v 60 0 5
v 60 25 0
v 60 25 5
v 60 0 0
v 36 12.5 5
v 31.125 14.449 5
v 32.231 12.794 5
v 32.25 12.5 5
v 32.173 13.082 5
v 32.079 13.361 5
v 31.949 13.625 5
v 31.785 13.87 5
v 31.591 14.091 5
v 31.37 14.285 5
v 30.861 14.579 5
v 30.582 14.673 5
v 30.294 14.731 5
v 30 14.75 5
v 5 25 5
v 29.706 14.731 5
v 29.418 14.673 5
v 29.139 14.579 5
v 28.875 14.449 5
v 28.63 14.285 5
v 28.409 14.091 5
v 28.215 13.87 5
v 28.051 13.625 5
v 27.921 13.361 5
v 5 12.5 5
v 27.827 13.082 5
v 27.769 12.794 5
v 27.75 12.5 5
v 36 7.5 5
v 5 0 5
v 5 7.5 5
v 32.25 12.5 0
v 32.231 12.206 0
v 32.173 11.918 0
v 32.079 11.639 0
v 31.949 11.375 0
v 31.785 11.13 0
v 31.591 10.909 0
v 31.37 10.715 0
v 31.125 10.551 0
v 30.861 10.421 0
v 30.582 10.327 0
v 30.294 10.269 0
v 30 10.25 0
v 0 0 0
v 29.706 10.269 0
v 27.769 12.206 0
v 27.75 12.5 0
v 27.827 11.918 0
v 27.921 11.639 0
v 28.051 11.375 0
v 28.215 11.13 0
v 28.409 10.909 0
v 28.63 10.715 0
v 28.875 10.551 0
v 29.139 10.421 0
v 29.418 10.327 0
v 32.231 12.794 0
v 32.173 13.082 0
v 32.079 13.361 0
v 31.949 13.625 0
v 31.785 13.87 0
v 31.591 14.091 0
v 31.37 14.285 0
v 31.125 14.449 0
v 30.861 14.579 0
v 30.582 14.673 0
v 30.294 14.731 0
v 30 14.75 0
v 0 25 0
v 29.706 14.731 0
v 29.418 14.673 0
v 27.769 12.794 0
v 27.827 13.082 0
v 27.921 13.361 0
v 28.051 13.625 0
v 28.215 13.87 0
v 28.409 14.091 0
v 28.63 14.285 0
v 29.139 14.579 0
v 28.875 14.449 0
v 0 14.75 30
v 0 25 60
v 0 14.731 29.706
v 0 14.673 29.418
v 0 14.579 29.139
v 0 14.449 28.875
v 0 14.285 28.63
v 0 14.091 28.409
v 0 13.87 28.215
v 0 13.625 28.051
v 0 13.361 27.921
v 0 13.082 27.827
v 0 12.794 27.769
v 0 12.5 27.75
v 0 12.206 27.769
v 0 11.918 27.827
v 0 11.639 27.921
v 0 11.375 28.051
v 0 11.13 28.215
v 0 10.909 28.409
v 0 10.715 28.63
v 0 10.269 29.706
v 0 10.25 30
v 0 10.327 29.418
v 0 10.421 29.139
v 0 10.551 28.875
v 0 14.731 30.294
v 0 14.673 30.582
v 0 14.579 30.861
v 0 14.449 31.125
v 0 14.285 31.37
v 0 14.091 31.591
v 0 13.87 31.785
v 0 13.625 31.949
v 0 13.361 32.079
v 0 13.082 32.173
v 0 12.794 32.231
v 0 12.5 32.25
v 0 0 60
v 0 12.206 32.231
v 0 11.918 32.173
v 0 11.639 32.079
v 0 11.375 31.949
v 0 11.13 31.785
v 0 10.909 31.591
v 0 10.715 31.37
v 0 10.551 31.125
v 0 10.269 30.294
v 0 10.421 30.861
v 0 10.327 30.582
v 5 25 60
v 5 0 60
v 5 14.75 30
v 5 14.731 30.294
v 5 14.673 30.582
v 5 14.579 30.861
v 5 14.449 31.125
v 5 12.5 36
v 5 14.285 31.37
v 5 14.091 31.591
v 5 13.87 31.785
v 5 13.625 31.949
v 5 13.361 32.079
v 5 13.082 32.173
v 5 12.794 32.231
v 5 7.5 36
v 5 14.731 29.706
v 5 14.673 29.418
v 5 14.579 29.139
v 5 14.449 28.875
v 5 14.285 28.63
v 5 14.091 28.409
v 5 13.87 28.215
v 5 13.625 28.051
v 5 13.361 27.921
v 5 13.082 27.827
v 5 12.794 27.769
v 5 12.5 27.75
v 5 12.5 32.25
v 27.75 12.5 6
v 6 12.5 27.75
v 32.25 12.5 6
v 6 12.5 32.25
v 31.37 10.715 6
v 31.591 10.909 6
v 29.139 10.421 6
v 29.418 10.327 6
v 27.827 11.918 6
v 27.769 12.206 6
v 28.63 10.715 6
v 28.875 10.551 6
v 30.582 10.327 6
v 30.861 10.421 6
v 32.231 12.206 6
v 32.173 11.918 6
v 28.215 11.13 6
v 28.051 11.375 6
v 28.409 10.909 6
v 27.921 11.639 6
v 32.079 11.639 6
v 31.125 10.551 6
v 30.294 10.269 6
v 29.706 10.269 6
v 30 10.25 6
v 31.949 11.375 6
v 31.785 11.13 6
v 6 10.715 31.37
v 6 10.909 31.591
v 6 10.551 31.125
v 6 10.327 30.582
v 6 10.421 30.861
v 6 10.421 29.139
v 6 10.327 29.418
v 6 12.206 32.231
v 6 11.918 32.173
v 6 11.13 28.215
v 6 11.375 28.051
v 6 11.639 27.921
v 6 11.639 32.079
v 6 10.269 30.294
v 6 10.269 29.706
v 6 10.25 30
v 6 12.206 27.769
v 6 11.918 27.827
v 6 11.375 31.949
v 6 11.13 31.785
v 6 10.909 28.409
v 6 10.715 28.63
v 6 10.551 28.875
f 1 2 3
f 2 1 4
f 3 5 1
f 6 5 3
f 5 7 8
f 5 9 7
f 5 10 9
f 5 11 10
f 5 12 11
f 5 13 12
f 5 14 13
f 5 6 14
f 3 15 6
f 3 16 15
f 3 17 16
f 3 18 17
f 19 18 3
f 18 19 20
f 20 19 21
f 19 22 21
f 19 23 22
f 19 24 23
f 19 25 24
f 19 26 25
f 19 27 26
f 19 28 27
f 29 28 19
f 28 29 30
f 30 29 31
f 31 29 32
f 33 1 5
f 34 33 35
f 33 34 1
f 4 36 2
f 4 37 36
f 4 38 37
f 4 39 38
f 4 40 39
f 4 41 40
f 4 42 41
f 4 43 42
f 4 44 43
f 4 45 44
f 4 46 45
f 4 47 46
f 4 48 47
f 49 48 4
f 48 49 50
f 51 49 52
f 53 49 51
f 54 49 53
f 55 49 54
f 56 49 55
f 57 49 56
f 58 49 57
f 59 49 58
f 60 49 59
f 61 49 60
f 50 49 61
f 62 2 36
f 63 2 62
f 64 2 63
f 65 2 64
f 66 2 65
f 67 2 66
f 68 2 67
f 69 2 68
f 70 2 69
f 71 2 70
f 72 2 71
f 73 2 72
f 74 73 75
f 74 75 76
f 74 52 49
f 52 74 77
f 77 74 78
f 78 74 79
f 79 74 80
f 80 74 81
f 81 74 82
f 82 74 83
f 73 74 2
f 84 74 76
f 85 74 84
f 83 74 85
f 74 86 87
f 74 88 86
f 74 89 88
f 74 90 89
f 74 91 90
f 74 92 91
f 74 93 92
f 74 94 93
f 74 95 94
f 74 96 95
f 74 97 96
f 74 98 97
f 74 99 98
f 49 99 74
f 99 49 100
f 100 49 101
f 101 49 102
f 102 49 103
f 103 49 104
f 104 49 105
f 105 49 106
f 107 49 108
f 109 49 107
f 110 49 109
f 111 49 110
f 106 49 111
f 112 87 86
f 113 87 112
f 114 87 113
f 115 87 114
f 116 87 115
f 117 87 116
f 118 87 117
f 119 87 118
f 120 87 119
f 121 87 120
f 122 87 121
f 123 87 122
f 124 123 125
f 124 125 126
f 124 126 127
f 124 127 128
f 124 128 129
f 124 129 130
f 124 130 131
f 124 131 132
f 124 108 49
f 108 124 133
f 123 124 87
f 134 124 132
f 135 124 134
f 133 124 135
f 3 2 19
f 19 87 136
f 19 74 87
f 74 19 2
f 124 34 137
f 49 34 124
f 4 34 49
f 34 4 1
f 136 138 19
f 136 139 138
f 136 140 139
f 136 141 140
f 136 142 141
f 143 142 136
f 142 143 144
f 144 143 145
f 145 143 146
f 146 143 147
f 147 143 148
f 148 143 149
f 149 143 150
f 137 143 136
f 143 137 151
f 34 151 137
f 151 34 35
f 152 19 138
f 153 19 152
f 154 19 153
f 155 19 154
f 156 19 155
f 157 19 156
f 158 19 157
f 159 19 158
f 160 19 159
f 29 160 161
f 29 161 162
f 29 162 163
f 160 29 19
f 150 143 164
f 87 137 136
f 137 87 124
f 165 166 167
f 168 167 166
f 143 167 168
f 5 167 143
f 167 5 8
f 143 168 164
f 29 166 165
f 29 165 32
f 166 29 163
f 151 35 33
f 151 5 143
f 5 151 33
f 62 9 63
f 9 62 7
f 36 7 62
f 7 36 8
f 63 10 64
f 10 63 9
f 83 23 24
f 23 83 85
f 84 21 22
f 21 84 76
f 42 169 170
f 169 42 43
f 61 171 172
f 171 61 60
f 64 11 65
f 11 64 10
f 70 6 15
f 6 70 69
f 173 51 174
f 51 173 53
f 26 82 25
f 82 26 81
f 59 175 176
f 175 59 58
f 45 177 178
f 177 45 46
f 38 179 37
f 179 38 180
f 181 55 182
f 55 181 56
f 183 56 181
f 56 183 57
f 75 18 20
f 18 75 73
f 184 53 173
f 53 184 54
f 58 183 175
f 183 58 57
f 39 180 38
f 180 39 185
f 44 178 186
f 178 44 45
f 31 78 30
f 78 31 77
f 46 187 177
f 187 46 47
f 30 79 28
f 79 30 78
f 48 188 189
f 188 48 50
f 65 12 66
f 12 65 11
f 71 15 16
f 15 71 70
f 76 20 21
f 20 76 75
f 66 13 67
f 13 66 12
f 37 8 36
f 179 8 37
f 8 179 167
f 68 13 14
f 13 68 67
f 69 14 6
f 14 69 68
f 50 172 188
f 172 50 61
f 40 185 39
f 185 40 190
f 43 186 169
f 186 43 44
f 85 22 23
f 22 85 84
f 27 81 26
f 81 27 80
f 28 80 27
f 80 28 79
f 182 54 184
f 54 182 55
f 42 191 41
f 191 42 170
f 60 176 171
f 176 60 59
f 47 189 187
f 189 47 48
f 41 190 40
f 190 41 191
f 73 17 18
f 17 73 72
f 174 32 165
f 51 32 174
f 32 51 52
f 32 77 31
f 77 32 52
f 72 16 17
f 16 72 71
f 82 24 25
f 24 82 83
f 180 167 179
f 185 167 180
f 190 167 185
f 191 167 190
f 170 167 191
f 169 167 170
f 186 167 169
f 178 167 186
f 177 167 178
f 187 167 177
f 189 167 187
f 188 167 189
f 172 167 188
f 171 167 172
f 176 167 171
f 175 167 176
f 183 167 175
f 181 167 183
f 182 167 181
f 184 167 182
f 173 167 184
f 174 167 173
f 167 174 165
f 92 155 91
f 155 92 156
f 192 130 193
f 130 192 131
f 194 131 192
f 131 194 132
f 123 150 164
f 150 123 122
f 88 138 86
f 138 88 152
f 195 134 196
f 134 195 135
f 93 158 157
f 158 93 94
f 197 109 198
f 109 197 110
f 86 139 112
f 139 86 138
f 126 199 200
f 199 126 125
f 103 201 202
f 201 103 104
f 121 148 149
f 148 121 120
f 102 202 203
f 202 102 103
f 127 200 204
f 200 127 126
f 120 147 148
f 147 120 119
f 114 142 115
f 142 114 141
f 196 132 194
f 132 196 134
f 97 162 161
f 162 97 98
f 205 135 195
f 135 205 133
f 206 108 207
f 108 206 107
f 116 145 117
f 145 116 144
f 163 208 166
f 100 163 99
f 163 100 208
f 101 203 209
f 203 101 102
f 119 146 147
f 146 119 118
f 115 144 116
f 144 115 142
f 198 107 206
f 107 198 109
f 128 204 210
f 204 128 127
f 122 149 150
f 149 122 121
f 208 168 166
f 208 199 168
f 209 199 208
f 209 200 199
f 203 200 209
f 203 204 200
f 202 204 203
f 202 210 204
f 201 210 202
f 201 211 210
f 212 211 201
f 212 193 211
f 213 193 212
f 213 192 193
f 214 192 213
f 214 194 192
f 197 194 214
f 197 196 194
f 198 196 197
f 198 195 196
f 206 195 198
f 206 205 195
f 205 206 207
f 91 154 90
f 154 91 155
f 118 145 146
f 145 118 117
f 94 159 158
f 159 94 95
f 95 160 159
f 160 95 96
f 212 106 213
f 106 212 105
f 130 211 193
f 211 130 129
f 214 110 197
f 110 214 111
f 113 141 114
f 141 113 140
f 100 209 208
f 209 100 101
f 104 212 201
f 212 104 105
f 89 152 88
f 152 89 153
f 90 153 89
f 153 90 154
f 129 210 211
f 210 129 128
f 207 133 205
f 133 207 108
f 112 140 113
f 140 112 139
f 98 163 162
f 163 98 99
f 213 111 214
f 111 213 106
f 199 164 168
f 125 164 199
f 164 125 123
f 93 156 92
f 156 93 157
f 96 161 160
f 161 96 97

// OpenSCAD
// Forge catalog: L-bracket / shelf bracket with screw holes and optional gusset
leg_a     = 60;   // vertical leg length (mm)
leg_b     = 60;   // horizontal leg length (mm)
width     = 25;   // bracket width (mm)
thickness = 5;    // plate thickness (mm)
hole_dia  = 4.5;  // screw hole diameter (mm), 0 = no holes
holes     = 1;    // holes per leg (0, 1 or 2)
gusset    = 1;    // 1 = add a triangular gusset, 0 = none
$fn = 48;

module leg_holes(len) {
    if (hole_dia > 0 && holes > 0) {
        for (i = [1 : holes]) {
            translate([len * i / (holes + 1), 0, -1]) cylinder(d = hole_dia, h = thickness + 2);
        }
    }
}
difference() {
    union() {
        // horizontal leg along +X, lying on the bed
        cube([leg_b, width, thickness]);
        // vertical leg along +Z at x = 0
        cube([thickness, width, leg_a]);
        if (gusset == 1) {
            g = min(leg_a, leg_b) * 0.6;
            translate([0, width/2 - thickness/2, 0])
                rotate([90, 0, 0]) translate([0, 0, -thickness/2])
                linear_extrude(height = thickness) polygon([[thickness, thickness], [g, thickness], [thickness, g]]);
        }
    }
    // holes in the horizontal leg (drilled along Z)
    translate([0, width/2, 0]) leg_holes(leg_b);
    // holes in the vertical leg (drilled along X)
    translate([0, width/2, 0]) rotate([0, -90, 0]) translate([0, 0, -thickness - 1]) leg_holes_v();
}
module leg_holes_v() {
    if (hole_dia > 0 && holes > 0) {
        for (i = [1 : holes]) {
            translate([leg_a * i / (holes + 1), 0, 0]) cylinder(d = hole_dia, h = thickness + 2);
        }
    }
}
